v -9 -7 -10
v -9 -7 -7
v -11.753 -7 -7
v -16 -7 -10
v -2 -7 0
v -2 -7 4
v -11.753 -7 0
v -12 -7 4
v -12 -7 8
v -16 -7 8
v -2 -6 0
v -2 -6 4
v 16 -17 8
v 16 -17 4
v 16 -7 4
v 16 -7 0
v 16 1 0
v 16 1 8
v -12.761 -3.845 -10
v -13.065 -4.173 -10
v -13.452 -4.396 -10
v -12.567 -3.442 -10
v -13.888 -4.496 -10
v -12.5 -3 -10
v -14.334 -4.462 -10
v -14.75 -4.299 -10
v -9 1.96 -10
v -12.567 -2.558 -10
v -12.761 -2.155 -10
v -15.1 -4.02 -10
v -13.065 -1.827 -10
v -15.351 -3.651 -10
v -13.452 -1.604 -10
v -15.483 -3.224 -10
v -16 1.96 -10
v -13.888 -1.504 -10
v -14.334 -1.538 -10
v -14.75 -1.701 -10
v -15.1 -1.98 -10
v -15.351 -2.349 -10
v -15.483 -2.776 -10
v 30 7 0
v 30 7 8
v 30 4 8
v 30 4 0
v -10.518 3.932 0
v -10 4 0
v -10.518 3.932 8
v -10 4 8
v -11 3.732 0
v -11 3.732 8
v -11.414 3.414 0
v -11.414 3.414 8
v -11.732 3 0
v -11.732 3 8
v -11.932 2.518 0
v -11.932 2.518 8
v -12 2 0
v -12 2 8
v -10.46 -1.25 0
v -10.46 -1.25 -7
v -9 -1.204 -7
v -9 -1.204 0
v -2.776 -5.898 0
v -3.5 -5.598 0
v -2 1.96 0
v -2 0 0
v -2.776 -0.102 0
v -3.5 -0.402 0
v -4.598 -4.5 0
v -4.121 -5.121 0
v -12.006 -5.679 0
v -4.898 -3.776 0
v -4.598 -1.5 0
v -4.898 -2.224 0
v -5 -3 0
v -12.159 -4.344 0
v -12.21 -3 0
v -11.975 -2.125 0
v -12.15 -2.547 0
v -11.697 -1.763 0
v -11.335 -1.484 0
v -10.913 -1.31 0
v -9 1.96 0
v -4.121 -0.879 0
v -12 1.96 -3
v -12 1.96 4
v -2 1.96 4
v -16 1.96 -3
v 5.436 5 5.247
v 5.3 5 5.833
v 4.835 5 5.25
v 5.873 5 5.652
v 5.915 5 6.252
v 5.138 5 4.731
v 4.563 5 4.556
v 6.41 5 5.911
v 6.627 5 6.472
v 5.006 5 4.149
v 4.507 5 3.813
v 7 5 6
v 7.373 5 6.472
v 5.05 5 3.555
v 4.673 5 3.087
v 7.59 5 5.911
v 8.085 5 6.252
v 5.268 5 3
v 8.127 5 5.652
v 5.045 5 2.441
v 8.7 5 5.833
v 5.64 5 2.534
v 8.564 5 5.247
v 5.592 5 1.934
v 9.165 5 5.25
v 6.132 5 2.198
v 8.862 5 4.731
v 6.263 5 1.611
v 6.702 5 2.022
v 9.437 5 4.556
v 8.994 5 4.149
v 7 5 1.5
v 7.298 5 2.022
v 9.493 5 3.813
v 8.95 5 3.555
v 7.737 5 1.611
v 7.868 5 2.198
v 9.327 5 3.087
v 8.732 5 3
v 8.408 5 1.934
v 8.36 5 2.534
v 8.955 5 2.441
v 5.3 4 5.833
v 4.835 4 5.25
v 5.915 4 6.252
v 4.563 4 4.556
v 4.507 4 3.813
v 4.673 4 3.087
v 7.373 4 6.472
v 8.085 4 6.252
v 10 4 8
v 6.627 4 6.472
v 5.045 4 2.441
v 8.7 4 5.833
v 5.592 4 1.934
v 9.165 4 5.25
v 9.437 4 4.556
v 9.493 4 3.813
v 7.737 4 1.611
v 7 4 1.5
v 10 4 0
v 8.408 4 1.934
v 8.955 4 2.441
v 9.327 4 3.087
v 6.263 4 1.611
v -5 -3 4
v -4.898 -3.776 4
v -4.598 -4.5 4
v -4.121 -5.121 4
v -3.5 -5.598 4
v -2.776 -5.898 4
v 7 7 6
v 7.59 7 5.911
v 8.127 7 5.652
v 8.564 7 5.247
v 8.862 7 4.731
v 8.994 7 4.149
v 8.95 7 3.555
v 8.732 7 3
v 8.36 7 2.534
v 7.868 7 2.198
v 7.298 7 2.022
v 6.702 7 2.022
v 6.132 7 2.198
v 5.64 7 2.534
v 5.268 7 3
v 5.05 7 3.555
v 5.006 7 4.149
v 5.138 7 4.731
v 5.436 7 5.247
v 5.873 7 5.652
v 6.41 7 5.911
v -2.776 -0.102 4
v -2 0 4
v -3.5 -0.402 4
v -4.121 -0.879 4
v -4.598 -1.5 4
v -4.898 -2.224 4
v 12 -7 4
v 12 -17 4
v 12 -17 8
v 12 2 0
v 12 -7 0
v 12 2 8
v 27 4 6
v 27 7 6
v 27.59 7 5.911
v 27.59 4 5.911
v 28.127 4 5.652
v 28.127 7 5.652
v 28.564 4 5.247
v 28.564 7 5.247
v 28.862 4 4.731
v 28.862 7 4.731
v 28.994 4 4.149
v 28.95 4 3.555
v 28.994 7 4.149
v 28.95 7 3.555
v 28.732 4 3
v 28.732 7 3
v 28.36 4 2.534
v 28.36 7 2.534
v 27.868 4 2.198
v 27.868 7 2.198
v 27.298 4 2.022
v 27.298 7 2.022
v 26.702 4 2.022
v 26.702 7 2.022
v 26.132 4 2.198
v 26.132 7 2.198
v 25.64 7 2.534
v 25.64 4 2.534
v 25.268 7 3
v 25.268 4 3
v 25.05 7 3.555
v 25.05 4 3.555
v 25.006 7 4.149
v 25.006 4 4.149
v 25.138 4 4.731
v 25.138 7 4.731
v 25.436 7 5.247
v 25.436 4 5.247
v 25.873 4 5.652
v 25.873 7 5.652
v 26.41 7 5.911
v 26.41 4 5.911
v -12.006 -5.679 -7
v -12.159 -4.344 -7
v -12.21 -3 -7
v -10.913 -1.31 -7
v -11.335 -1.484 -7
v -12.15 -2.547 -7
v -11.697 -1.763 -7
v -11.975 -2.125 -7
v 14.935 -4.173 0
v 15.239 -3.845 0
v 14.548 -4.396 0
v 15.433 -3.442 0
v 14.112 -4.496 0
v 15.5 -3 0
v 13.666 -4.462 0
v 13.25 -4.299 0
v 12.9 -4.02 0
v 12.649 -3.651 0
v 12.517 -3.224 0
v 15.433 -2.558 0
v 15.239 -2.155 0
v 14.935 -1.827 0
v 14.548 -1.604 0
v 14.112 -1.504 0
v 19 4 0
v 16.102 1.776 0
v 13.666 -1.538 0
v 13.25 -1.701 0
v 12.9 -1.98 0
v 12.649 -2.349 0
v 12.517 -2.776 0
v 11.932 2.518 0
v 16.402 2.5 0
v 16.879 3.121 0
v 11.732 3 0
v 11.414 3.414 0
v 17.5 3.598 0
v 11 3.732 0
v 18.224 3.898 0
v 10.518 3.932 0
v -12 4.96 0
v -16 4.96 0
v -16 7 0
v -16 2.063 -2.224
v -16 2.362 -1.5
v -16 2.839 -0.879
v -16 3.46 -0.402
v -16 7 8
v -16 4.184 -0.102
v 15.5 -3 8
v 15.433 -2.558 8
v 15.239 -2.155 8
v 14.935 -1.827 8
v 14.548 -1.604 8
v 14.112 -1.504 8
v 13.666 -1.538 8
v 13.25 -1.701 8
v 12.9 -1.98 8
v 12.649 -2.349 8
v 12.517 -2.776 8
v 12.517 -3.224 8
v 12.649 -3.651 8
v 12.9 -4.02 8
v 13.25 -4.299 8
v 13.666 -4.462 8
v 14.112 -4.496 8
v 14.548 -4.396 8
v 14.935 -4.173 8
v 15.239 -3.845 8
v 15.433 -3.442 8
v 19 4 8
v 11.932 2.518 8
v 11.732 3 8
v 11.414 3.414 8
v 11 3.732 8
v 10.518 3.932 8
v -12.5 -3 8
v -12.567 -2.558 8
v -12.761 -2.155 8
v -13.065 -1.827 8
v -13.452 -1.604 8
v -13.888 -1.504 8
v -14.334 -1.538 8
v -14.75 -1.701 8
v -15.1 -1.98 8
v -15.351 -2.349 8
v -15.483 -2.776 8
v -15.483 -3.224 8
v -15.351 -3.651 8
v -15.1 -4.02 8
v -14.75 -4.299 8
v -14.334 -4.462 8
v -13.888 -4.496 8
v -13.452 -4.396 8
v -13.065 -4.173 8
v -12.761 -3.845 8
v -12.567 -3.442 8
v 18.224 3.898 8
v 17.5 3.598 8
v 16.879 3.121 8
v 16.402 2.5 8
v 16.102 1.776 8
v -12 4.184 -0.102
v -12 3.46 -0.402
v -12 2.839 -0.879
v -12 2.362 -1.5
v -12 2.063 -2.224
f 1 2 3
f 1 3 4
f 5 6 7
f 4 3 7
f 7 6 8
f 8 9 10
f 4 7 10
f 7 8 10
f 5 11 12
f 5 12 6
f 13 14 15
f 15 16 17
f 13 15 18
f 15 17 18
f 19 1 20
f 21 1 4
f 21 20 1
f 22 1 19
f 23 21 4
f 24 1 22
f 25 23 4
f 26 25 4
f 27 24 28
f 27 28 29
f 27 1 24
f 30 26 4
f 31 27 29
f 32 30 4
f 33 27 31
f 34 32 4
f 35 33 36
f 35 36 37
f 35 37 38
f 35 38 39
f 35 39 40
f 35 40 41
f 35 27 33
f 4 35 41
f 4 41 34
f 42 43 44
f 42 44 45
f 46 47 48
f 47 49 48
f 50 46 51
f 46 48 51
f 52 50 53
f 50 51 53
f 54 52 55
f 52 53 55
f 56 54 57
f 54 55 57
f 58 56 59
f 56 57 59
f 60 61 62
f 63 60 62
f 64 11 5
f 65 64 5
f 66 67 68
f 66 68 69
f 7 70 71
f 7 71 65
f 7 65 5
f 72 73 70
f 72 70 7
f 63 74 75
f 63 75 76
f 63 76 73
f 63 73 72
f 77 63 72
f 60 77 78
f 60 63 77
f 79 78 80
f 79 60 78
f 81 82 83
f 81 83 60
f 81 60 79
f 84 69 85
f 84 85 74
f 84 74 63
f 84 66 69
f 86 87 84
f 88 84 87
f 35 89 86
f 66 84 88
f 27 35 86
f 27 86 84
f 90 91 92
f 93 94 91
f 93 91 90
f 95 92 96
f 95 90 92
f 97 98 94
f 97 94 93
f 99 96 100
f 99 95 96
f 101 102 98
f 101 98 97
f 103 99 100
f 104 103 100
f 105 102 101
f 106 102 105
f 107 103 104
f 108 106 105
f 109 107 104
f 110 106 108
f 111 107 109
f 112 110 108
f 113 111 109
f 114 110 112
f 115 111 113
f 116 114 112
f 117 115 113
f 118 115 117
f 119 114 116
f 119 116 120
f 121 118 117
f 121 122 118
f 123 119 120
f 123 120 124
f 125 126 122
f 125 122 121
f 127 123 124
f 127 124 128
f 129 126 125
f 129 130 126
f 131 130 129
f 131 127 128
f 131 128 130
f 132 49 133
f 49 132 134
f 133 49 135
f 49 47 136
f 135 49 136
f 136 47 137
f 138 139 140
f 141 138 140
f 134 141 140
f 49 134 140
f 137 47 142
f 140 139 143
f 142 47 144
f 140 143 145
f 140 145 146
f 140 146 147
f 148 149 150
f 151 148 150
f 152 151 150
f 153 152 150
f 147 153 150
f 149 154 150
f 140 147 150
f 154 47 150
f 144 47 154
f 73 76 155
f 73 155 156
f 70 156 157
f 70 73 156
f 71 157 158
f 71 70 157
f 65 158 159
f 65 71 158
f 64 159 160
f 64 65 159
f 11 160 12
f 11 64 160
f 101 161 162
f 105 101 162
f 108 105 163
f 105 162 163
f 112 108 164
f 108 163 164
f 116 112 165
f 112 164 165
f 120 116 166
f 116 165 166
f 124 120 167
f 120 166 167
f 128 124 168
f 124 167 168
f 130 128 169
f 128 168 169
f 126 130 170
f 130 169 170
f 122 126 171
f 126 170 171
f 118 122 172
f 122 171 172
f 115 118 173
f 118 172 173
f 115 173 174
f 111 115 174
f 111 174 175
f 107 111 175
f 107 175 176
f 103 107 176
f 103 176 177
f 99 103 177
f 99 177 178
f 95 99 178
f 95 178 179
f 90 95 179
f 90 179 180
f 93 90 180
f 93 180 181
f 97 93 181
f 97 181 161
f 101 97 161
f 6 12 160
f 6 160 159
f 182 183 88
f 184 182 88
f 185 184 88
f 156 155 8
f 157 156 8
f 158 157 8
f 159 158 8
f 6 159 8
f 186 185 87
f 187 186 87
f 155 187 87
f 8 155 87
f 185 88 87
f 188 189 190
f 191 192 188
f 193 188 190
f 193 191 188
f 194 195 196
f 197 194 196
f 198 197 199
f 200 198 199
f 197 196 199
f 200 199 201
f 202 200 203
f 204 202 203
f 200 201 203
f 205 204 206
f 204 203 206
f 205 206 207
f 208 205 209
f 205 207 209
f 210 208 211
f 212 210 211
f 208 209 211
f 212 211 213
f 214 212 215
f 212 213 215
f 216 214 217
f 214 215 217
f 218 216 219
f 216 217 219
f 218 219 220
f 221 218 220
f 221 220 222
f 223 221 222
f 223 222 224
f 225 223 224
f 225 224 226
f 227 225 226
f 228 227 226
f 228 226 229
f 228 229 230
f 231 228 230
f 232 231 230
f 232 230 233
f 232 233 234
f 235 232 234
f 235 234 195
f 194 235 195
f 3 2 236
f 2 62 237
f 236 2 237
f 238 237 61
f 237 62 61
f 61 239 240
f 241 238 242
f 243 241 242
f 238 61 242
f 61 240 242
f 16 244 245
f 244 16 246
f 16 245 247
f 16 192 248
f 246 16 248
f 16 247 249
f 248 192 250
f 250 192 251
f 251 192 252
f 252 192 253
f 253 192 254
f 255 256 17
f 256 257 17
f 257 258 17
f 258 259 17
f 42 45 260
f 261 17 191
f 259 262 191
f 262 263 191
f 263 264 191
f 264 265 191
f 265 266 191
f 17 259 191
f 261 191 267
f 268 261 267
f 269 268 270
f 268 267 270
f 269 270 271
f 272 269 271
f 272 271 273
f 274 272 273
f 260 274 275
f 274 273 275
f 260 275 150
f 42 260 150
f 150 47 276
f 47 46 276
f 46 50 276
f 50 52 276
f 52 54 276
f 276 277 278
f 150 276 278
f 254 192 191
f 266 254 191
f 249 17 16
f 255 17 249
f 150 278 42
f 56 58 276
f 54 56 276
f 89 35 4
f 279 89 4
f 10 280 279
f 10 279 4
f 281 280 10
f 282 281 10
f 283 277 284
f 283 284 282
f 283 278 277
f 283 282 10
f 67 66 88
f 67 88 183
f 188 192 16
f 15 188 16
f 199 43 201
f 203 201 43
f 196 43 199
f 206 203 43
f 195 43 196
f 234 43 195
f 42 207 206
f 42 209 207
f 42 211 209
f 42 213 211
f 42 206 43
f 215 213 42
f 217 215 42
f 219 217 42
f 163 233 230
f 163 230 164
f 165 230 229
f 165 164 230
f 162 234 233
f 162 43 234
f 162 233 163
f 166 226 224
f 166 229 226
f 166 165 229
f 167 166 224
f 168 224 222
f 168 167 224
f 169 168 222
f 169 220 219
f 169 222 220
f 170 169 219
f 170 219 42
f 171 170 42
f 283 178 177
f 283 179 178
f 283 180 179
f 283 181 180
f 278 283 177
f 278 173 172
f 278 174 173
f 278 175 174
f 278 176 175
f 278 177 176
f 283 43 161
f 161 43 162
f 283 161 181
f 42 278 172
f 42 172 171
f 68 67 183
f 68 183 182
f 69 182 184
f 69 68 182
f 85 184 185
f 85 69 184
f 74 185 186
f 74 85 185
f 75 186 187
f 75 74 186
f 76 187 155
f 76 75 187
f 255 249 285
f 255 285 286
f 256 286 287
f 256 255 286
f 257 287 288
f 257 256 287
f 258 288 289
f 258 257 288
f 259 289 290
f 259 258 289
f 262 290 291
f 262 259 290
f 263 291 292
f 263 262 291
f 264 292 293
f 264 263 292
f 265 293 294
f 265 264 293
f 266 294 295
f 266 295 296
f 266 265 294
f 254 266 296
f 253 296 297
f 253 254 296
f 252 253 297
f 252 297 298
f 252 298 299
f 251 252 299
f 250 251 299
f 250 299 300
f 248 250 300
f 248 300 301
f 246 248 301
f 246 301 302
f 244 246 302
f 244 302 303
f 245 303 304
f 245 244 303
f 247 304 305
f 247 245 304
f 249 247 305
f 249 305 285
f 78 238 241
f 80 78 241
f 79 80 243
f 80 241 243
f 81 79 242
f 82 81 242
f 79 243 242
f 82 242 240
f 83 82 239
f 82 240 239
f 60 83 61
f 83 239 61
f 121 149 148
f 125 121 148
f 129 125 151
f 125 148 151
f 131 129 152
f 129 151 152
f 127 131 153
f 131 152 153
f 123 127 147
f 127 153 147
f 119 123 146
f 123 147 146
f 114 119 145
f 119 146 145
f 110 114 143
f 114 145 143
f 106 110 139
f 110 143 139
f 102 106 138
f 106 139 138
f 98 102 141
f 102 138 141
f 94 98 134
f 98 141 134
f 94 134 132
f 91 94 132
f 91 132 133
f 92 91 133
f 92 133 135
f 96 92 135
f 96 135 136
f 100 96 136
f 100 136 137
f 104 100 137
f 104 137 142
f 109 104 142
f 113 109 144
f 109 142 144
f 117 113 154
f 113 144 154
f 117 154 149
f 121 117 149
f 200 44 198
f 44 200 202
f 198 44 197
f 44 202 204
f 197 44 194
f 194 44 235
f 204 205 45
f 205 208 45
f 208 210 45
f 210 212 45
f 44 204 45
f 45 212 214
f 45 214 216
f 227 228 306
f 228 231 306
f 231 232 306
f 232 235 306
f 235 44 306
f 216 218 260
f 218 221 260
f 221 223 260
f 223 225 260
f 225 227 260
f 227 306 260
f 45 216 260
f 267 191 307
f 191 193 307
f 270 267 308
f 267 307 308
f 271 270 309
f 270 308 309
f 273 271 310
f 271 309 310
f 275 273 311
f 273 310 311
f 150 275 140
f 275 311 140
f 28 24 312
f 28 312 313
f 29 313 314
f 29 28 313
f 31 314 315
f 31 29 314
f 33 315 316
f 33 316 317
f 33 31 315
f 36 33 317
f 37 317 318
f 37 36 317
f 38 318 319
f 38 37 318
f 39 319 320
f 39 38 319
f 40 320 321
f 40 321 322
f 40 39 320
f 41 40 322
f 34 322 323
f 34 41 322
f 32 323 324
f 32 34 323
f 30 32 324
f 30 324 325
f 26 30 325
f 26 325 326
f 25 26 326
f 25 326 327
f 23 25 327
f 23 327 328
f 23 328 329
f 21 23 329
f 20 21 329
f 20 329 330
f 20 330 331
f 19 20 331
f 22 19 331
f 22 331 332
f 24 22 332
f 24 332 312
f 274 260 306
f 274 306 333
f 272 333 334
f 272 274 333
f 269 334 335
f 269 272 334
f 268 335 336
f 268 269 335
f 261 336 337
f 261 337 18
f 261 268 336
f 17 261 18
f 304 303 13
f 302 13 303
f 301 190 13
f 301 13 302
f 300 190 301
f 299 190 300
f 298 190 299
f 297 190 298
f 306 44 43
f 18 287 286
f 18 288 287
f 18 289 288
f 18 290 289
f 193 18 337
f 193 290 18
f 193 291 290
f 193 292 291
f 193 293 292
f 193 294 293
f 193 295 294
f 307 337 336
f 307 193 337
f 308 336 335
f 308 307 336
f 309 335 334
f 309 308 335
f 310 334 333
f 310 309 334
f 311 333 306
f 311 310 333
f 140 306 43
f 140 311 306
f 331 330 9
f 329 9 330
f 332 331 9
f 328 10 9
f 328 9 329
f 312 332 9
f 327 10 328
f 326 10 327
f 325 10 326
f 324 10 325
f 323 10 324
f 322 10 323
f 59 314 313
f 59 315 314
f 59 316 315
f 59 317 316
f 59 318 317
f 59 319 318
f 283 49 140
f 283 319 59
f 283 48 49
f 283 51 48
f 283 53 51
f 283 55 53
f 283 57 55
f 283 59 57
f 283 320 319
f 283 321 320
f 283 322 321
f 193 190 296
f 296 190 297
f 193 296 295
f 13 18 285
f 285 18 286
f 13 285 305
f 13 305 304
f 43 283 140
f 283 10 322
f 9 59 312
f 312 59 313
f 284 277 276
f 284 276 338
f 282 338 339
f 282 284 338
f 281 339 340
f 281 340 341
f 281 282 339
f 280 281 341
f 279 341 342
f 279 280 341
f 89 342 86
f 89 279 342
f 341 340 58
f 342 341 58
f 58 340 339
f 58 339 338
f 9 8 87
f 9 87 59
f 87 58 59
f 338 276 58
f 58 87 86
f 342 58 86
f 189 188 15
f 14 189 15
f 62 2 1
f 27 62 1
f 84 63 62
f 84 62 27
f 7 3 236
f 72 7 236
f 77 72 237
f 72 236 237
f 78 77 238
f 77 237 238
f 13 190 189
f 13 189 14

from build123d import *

# Parameters (mm, degrees)
SKETCH_1_R          = 1.5
EXTRUDE_1_DEPTH     = 8
EXTRUDE_2_DEPTH     = 4
SKETCH_4_W          = 7
SKETCH_4_H          = 14
EXTRUDE_3_DEPTH     = 10
CUT_EXTRUDE_START   = -3
CUT_EXTRUDE_1_DEPTH = 7
SKETCH_6_W          = 7
SKETCH_6_H          = 5.039650546
CUT_EXTRUDE_3_DEPTH = 10
CUT_EXTRUDE_START_2 = -10
SKETCH_7_R          = 1.5
CUT_EXTRUDE_4_DEPTH = 10
SKETCH_9_W          = 8
SKETCH_9_H          = 3
EXTRUDE_4_DEPTH     = 7
FILLET_3_R          = 3
FILLET_4_R          = 2
SKETCH_10_W         = 4
SKETCH_10_H         = 4
EXTRUDE_5_DEPTH     = 10
SKETCH_8_R          = 2
CUT_EXTRUDE_6_DEPTH = 10
SKETCH_13_R         = 2.5
CUT_EXTRUDE_7_DEPTH = 1
SKETCH_14_W         = 8
SKETCH_14_H         = 3
EXTRUDE_6_DEPTH     = 7
FILLET_5_R          = 2
SKETCH_15_R         = 2
CUT_EXTRUDE_8_DEPTH = 7


with BuildPart() as part:
    # 草图1 → 凸台-拉伸1 (new body)
    with BuildSketch(Plane.XY):
        Polygon((16, 7), (-16, 7), (-16, -7), (-12, -7), (-12, 4), (12, 4), (12, -7), (16, -7), align=None)
        with Locations((-14, -3)):
            Circle(SKETCH_1_R, mode=Mode.SUBTRACT)
        with Locations((14, -3)):
            Circle(SKETCH_1_R, mode=Mode.SUBTRACT)
    extrude(amount=EXTRUDE_1_DEPTH)

    # 草图3 → 凸台-拉伸2 (add)
    with BuildSketch(Plane(origin=(0, 0, 0), x_dir=(-1, 0, 0), z_dir=(0, 0, -1))):
        with BuildLine():
            Line((2, -7), (12, -7))
            Line((12, -7), (12, 1.960349454))
            Line((12, 1.960349454), (2, 1.960349454))
            Line((2, 1.960349454), (2, 0))
            ThreePointArc((2, 0), (4.121320344, -0.878679656), (5, -3))
            ThreePointArc((5, -3), (4.121320344, -5.121320344), (2, -6))
            Line((2, -6), (2, -7))
        make_face()
    extrude(amount=-EXTRUDE_2_DEPTH)

    # 草图4 → 凸台-拉伸3 (add)
    with BuildSketch(Plane(origin=(0, 0, 0), x_dir=(-1, 0, 0), z_dir=(0, 0, -1))):
        with Locations((12.5, 0)):
            Rectangle(SKETCH_4_W, SKETCH_4_H)
    extrude(amount=EXTRUDE_3_DEPTH)

    # 草图5 → 切除-拉伸1 (cut)
    with BuildSketch(Plane(origin=(0, 0, -10), x_dir=(-1, 0, 0), z_dir=(0, 0, -1)).offset(CUT_EXTRUDE_START)):
        with BuildLine():
            ThreePointArc((12.209881979, -3), (11.697318846, -1.762563133), (10.459881979, -1.25))
            ThreePointArc((10.459881979, -1.25), (9.631108119, -1.458690852), (9, -2.034989841))
            Line((9, -2.034989841), (9, -3.965010159))
            ThreePointArc((9, -3.965010159), (10.963720513, -4.675901767), (12.209881979, -3))
        make_face()
        with BuildLine():
            Line((9, -3.965010159), (9, -2.034989841))
            ThreePointArc((9, -2.034989841), (8.709881979, -3), (9, -3.965010159))
        make_face()
        with BuildLine():
            ThreePointArc((11.753305584, -7), (12.095368491, -5.012986712), (12.209881979, -3))
            ThreePointArc((12.209881979, -3), (10.963720513, -4.675901767), (9, -3.965010159))
            Line((9, -3.965010159), (9, -7))
            Line((9, -7), (11.753305584, -7))
        make_face()
        with BuildLine():
            Line((10.459881979, -1.25), (9, -1.204378688))
            Line((9, -1.204378688), (9, -2.034989841))
            ThreePointArc((9, -2.034989841), (9.631108119, -1.458690852), (10.459881979, -1.25))
        make_face()
    extrude(amount=-CUT_EXTRUDE_1_DEPTH, mode=Mode.SUBTRACT)

    # 草图6 → 切除-拉伸3 (cut)
    with BuildSketch(Plane(origin=(0, 0, -10), x_dir=(-1, 0, 0), z_dir=(0, 0, -1))):
        with Locations((12.5, 4.480174727)):
            Rectangle(SKETCH_6_W, SKETCH_6_H)
    extrude(amount=-CUT_EXTRUDE_3_DEPTH, mode=Mode.SUBTRACT)

    # 草图7 → 切除-拉伸4 (cut)
    with BuildSketch(Plane.XY.offset(CUT_EXTRUDE_START_2)):
        with Locations((-14, -3)):
            Circle(SKETCH_7_R)
    extrude(amount=CUT_EXTRUDE_4_DEPTH, mode=Mode.SUBTRACT)

    # 草图9 → 凸台-拉伸4 (add)
    with BuildSketch(Plane(origin=(16, 0, 0), x_dir=(0, 0, -1), z_dir=(1, 0, 0))):
        with Locations((-4, 5.5)):
            Rectangle(SKETCH_9_W, SKETCH_9_H)
    extrude(amount=EXTRUDE_4_DEPTH)

    # 圆角3
    # the kernel refuses this fillet: 3 mm, written as the material it adds along each edge
    with BuildSketch(Plane(origin=(-16, 1.960349454, 0), x_dir=(0, 0, -1), z_dir=(1, 0, 0))) as fillet_3_piece_1:
        with BuildLine():
            CenterArc((FILLET_3_R, FILLET_3_R), FILLET_3_R, 180, 90)
            Line((0, FILLET_3_R), (0, 0))
            Line((0, 0), (FILLET_3_R, 0))
        make_face()
    extrude(amount=4)
    with BuildSketch(Plane(origin=(16, 4, 0), x_dir=(1, 0, 0), z_dir=(0, 0, 1))) as fillet_3_piece_2:
        with BuildLine():
            CenterArc((FILLET_3_R, -FILLET_3_R), FILLET_3_R, 90, 90)
            Line((0, -FILLET_3_R), (0, 0))
            Line((0, 0), (FILLET_3_R, 0))
        make_face()
    extrude(amount=8)

    # 圆角4
    fillet_4_edges = [part.edges().sort_by_distance(p)[0] for p in [
        (-12, 4, 4),
    ]]
    fillet(fillet_4_edges, radius=FILLET_4_R)

    # 草图10 → 凸台-拉伸5 (add)
    with BuildSketch(Plane.XZ.offset(7)):
        with Locations((14, 6)):
            Rectangle(SKETCH_10_W, SKETCH_10_H)
    extrude(amount=EXTRUDE_5_DEPTH)

    # 草图8 → 切除-拉伸6 (cut)
    with BuildSketch(Plane(origin=(0, 7, 0), x_dir=(1, 0, 0), z_dir=(0, 1, 0))):
        with Locations(Location((7, -4, 0), (0, 0, 270))):
            Circle(SKETCH_8_R)
        with Locations((27, -4)):
            Circle(SKETCH_8_R)
    extrude(amount=-CUT_EXTRUDE_6_DEPTH, mode=Mode.SUBTRACT)

    # 草图13 → 切除-拉伸7 (cut)
    with BuildSketch(Plane.XZ.offset(-4)):
        with Locations(Location((7, 4, 0), (0, 0, 270))):
            Circle(SKETCH_13_R)
    extrude(amount=-CUT_EXTRUDE_7_DEPTH, mode=Mode.SUBTRACT)

    # 草图14 → 凸台-拉伸6 (add)
    with BuildSketch(Plane(origin=(23, 0, 0), x_dir=(0, 0, -1), z_dir=(1, 0, 0))):
        with Locations((-4, 5.5)):
            Rectangle(SKETCH_14_W, SKETCH_14_H)
    extrude(amount=EXTRUDE_6_DEPTH)

    # 圆角5
    fillet_5_edges = [part.edges().sort_by_distance(p)[0] for p in [
        (12, 4, 4),
    ]]
    fillet(fillet_5_edges, radius=FILLET_5_R)

    # 草图15 → 切除-拉伸8 (cut)
    with BuildSketch(Plane(origin=(0, 7, 0), x_dir=(1, 0, 0), z_dir=(0, 1, 0))):
        with Locations(Location((27, -4, 0), (0, 0, 270))):
            Circle(SKETCH_15_R)
        with Locations(Location((7, -4, 0), (0, 0, 270))):
            Circle(SKETCH_15_R)
    extrude(amount=-CUT_EXTRUDE_8_DEPTH, mode=Mode.SUBTRACT)


solid = part.part
